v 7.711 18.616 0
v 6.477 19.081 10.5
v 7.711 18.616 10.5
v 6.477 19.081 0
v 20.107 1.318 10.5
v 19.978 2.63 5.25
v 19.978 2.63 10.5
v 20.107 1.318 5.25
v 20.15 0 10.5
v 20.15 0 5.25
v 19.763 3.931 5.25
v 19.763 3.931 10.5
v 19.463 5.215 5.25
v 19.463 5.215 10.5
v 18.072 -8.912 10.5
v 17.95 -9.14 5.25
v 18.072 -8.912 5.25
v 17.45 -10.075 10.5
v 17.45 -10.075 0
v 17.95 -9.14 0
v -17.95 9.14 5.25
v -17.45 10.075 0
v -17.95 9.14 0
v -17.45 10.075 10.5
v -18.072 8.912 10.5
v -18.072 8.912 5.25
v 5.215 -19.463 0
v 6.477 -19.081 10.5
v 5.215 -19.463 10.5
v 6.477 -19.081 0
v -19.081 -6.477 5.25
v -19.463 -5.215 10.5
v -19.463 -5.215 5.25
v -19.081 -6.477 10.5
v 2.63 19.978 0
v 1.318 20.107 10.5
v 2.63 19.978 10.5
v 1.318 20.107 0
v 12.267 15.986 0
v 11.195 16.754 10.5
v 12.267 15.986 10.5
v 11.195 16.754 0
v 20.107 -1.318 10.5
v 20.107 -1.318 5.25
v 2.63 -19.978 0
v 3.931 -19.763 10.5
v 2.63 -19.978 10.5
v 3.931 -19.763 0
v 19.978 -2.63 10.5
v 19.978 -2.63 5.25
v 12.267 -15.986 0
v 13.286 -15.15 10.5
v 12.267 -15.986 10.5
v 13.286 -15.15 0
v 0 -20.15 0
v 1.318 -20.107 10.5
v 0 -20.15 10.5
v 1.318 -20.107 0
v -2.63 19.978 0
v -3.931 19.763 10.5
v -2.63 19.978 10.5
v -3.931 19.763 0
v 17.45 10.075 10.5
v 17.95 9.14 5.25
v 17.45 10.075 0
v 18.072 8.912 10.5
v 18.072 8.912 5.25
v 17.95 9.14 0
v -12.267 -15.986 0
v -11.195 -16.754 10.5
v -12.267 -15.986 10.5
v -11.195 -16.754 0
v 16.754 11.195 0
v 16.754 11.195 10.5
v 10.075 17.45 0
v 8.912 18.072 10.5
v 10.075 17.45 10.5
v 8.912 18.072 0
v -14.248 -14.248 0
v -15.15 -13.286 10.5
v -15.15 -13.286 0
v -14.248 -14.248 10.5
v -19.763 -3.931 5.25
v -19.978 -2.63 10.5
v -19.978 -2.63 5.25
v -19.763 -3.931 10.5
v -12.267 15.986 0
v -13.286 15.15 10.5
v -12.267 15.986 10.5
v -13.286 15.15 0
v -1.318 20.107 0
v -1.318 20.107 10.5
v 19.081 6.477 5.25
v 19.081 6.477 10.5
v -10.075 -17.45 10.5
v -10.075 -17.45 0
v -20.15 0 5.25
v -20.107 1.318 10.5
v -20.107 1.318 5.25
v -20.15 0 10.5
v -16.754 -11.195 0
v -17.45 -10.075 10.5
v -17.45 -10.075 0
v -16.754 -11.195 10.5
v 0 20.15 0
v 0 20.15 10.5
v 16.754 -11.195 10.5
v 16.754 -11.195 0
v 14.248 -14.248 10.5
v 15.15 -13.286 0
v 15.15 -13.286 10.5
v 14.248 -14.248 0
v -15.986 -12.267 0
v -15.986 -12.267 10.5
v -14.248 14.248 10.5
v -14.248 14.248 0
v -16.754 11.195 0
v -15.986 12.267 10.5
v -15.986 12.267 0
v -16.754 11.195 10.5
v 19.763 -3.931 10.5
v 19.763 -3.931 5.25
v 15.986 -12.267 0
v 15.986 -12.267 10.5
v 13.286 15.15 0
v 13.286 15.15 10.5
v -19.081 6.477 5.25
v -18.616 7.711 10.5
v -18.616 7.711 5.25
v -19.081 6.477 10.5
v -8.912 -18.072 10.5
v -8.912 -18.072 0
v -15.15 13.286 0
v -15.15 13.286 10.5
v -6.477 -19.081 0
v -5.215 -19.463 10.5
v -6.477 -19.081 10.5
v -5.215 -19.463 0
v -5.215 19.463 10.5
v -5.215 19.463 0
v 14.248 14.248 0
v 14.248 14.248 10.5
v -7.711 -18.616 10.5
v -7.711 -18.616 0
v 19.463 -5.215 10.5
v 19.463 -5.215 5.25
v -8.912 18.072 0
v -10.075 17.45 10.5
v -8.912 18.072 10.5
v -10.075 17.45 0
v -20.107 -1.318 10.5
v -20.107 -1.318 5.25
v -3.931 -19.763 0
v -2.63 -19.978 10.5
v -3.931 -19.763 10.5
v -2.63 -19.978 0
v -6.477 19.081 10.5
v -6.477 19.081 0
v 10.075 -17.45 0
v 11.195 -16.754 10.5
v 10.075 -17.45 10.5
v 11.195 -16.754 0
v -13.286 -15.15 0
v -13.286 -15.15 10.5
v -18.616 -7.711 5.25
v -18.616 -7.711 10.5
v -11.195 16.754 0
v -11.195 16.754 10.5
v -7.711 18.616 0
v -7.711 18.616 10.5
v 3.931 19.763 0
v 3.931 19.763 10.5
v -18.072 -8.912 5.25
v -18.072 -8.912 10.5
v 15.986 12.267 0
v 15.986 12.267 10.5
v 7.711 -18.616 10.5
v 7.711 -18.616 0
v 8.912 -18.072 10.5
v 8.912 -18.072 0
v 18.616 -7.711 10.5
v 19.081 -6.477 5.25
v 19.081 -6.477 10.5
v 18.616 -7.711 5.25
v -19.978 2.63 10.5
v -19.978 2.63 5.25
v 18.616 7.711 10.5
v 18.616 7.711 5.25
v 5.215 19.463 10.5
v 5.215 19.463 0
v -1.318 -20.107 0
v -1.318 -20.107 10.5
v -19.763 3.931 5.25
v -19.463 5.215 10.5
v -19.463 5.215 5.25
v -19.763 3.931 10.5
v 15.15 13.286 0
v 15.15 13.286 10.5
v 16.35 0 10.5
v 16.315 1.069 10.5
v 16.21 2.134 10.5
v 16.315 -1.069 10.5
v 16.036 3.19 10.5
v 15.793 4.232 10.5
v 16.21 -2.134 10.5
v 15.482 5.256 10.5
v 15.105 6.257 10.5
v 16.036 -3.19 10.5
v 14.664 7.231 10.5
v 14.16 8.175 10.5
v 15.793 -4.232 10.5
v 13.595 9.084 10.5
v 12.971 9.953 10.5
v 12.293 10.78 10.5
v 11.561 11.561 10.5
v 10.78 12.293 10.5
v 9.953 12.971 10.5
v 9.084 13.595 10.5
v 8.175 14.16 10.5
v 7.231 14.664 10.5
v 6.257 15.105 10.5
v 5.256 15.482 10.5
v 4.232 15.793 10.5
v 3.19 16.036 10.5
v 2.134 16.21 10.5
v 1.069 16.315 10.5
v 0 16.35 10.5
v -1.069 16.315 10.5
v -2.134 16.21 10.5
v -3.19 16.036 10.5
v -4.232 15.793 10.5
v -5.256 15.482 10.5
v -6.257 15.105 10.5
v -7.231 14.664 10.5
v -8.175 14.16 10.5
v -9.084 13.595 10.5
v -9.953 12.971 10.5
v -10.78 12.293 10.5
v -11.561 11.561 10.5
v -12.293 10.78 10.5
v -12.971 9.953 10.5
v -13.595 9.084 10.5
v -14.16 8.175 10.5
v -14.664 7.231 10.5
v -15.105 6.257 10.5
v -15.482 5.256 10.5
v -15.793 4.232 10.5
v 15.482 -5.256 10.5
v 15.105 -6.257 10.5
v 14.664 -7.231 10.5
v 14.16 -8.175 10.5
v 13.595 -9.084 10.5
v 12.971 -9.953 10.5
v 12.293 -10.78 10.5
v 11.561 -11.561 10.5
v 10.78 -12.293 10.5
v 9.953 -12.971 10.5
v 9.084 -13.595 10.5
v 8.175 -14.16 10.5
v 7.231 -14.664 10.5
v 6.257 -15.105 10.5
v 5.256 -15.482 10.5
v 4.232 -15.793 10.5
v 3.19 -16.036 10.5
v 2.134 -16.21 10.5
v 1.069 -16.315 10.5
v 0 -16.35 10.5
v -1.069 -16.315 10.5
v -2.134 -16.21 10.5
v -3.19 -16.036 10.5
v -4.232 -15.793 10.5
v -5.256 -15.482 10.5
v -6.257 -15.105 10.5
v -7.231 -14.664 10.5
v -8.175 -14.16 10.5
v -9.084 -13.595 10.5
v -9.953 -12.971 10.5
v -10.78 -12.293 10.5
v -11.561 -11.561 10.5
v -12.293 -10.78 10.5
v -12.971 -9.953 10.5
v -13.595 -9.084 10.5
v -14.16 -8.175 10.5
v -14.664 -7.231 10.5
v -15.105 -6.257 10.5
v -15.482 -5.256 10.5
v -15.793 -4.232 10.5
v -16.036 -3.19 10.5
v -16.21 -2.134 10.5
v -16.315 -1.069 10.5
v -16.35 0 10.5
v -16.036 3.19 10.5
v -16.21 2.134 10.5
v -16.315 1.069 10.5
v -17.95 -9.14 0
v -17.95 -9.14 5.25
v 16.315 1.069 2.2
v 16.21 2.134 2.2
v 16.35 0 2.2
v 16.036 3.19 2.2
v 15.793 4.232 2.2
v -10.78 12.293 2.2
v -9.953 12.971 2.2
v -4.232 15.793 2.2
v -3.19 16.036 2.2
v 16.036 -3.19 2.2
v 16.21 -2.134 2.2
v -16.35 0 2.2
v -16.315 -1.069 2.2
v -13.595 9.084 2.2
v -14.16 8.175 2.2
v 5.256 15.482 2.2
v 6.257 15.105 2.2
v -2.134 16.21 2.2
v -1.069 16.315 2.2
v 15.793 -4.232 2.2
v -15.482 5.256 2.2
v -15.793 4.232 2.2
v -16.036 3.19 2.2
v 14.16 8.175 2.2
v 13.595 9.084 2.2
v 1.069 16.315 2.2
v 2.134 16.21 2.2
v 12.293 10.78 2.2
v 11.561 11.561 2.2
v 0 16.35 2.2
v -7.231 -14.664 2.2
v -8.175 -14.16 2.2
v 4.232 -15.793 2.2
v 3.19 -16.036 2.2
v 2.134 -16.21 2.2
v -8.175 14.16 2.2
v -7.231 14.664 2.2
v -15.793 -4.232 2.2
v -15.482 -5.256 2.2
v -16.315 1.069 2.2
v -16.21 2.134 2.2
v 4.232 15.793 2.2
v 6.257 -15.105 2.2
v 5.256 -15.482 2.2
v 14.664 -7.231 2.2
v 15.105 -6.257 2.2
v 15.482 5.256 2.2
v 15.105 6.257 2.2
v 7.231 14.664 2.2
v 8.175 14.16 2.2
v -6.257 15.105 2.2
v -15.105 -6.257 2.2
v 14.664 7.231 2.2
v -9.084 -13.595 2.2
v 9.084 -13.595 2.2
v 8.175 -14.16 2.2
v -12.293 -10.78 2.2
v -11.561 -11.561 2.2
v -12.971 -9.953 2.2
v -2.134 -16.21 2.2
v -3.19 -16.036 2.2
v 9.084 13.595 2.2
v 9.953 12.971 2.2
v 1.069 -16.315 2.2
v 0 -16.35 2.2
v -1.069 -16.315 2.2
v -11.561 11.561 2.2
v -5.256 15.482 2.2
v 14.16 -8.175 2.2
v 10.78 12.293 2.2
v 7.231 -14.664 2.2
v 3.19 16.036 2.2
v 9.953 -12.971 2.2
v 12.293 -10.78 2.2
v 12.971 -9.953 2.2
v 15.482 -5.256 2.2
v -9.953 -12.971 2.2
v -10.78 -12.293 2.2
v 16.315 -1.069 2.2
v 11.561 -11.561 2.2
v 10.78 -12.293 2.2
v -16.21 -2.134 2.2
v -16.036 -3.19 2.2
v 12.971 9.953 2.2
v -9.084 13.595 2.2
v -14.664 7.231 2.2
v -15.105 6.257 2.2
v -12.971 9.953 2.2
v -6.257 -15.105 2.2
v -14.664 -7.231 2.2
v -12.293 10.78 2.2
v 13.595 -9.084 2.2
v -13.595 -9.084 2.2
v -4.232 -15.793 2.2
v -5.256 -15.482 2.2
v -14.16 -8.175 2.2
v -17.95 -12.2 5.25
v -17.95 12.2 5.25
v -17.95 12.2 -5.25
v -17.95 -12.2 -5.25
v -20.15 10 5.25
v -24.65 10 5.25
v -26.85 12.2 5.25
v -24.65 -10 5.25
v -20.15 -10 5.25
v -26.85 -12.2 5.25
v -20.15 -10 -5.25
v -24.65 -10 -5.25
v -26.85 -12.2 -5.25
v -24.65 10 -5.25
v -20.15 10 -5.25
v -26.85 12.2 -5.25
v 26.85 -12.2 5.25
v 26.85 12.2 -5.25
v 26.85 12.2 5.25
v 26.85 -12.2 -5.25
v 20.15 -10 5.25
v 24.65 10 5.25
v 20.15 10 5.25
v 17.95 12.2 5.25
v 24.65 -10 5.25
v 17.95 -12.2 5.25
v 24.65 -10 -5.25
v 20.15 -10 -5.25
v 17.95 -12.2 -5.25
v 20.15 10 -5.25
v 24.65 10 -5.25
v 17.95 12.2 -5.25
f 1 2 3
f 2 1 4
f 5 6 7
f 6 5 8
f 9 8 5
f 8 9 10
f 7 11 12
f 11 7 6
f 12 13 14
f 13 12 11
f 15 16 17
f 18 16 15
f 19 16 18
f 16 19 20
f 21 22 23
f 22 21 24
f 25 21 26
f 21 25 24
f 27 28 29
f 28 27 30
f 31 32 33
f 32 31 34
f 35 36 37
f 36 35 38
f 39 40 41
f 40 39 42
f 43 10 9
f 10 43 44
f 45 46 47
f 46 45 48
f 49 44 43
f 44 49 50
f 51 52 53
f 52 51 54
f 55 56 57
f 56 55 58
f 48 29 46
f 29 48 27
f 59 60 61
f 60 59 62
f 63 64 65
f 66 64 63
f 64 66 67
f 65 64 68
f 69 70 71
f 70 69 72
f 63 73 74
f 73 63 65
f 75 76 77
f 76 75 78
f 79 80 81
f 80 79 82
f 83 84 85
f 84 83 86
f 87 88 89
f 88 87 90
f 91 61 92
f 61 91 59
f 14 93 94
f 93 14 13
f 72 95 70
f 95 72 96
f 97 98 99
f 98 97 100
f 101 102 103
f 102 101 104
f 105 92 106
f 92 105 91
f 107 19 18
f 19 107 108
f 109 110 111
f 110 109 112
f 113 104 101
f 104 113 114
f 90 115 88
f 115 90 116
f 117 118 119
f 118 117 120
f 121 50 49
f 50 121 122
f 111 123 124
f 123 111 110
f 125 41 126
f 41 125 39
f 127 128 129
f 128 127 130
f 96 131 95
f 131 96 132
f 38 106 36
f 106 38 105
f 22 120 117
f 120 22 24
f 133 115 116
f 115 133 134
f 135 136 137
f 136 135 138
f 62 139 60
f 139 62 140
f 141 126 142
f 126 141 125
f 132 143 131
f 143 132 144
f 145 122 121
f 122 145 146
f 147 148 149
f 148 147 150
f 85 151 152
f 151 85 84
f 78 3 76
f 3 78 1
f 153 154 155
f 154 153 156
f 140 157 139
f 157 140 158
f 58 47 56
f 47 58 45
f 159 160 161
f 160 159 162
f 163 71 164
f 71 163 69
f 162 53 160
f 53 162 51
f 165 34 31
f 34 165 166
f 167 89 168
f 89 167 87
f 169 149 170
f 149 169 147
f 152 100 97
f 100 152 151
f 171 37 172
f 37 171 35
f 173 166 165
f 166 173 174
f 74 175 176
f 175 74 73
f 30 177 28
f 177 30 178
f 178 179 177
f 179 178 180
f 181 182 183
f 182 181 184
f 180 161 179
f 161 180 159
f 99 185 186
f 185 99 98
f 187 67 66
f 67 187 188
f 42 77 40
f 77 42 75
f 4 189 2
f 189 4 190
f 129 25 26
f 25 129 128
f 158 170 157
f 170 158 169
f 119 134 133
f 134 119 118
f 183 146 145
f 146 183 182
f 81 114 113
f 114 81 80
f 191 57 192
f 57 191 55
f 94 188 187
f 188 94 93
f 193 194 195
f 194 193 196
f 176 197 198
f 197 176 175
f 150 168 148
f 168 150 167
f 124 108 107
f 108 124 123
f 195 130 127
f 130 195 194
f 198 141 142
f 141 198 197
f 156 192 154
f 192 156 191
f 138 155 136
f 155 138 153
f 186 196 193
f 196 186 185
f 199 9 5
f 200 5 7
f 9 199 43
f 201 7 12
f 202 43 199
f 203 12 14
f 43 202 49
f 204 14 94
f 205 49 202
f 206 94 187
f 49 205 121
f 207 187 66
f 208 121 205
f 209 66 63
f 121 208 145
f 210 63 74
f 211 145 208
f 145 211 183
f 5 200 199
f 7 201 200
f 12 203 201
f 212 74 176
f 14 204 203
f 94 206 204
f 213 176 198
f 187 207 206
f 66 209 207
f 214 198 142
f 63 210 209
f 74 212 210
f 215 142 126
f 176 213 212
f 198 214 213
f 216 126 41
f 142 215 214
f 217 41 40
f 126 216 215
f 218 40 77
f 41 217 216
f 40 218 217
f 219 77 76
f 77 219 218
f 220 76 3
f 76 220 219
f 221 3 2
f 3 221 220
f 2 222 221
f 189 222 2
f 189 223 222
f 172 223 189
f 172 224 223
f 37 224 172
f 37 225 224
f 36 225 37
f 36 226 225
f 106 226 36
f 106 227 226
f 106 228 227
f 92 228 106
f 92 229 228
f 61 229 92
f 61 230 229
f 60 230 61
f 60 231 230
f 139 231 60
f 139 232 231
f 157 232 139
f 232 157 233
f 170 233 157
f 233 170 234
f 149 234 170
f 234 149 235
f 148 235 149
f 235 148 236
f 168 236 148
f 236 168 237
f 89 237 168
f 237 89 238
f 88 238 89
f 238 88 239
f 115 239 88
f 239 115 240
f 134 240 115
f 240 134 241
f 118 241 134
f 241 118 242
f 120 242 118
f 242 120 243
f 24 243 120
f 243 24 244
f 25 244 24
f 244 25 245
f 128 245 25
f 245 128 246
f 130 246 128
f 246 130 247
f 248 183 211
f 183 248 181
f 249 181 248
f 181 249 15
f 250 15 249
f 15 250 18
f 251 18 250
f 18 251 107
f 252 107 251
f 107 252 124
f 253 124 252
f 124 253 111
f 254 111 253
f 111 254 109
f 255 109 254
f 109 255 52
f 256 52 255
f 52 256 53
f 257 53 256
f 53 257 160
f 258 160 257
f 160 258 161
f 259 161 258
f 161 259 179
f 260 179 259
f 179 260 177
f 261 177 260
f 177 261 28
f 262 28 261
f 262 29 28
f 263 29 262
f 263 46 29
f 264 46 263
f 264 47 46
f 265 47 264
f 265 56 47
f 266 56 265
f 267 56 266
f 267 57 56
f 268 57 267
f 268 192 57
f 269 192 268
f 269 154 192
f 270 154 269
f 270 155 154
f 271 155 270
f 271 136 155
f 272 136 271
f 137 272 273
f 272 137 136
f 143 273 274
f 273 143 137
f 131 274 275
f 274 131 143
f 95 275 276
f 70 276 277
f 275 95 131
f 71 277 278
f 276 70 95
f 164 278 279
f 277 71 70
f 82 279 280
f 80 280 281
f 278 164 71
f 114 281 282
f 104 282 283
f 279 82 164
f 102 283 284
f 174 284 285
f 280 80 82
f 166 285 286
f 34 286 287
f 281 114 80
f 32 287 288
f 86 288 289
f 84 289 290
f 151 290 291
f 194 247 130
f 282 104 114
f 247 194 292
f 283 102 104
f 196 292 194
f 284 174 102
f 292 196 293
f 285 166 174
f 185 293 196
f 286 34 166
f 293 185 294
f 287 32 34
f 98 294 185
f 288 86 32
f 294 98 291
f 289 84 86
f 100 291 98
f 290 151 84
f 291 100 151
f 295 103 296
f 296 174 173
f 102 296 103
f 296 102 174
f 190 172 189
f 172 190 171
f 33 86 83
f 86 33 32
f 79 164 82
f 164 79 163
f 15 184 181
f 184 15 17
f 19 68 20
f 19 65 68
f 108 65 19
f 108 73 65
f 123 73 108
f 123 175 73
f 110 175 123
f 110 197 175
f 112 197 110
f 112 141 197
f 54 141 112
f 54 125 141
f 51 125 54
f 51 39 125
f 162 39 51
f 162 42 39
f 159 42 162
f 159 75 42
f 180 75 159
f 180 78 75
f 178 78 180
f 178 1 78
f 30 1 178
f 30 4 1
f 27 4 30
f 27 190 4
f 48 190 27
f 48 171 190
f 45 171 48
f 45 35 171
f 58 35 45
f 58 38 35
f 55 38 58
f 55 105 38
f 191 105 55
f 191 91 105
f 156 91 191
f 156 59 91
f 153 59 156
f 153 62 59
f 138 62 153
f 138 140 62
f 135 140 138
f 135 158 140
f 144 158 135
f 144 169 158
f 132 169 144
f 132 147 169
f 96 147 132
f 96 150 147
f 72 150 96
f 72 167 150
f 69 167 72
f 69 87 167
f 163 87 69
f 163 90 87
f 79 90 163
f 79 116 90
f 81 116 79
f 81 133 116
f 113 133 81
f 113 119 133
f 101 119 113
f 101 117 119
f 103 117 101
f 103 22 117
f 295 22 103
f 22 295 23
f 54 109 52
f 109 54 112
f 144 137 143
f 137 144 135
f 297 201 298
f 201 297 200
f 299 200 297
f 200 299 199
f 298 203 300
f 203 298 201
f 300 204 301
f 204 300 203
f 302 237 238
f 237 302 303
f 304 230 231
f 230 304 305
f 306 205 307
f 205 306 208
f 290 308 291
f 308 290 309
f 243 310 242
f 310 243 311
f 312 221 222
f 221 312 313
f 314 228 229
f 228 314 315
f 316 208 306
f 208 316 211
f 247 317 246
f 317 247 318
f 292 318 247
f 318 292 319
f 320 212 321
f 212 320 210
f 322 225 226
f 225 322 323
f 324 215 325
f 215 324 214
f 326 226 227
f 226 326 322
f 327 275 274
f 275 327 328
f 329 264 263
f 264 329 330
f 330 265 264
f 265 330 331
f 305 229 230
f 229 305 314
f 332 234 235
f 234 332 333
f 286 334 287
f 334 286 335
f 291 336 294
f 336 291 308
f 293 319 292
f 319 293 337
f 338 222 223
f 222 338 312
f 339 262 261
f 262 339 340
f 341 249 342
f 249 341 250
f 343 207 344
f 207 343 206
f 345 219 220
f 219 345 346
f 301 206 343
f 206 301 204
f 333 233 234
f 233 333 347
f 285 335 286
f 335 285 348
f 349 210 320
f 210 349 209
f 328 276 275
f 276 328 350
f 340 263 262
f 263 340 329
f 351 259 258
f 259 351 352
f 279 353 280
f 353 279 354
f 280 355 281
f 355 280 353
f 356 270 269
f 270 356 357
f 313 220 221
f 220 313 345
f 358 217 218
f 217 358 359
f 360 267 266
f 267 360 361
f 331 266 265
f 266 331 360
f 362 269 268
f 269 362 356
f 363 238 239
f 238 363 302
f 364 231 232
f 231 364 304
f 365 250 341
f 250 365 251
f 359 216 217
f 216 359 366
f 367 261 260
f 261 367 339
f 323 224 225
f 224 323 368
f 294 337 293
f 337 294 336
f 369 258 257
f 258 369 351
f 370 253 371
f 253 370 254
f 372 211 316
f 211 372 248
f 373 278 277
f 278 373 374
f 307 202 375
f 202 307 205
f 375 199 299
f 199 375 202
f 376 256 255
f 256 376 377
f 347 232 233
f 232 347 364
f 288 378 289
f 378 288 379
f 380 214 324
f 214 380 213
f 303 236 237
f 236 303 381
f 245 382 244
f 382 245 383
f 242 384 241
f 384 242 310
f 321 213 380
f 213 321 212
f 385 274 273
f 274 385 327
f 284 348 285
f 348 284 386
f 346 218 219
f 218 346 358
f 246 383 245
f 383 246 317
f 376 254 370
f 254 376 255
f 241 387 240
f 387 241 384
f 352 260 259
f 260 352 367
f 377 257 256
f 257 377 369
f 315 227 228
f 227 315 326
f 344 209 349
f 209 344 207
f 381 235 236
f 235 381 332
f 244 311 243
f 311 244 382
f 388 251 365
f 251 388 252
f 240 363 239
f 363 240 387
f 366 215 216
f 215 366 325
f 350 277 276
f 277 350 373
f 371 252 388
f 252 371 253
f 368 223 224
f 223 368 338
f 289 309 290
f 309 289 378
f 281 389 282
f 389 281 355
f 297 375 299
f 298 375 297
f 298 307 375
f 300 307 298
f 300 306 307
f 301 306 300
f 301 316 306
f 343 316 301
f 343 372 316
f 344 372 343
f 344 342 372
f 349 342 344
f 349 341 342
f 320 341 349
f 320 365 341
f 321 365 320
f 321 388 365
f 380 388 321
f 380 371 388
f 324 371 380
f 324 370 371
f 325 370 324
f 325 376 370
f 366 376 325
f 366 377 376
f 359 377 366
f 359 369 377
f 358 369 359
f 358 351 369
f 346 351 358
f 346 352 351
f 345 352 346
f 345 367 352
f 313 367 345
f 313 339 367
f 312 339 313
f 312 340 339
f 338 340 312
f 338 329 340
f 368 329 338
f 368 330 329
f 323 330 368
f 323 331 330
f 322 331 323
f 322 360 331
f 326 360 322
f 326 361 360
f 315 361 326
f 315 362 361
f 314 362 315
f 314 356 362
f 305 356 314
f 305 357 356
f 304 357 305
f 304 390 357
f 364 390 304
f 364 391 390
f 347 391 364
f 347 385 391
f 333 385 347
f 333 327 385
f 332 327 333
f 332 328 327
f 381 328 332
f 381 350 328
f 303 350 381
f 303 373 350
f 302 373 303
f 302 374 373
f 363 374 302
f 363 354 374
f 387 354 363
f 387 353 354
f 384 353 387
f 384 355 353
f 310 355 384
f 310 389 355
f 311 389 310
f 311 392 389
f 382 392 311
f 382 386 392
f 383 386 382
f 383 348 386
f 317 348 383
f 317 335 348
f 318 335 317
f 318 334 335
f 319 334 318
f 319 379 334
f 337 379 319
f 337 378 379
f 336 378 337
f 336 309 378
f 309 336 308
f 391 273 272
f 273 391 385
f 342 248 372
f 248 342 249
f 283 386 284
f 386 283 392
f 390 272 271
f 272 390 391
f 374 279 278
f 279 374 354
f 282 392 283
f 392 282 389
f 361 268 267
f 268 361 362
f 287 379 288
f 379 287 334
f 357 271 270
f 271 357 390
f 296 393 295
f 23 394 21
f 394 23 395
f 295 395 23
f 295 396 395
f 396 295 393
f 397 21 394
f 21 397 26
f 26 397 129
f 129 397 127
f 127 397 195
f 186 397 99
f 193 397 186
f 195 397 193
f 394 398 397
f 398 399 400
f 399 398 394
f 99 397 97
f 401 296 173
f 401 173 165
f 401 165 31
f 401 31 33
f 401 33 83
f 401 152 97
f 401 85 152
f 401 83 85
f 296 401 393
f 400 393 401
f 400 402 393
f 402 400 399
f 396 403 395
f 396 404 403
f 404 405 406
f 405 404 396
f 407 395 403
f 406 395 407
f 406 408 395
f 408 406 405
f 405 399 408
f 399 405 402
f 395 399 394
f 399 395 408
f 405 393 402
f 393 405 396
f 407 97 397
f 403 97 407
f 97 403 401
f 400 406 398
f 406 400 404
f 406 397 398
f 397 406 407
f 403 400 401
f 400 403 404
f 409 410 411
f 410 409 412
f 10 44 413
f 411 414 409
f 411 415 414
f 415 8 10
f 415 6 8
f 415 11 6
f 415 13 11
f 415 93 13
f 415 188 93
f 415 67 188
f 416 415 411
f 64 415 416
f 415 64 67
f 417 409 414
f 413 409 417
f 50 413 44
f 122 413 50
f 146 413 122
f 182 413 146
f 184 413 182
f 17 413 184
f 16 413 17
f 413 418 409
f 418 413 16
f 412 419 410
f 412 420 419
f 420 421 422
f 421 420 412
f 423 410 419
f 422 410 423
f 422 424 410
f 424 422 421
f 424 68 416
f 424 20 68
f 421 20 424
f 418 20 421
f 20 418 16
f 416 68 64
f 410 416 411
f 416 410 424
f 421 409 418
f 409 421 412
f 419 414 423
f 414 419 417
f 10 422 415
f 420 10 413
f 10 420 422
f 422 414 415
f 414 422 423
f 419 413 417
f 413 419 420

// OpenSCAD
// TS-PET-B01 - AirTag Collar Holder
$fn = 96; airtag_d = 31.9; wall = 2.2; overall_t = 10.5; strap_w = 20; loop_wall = 2.2; loop_gap = 4.5;
module ring_shell() { difference() { cylinder(h = overall_t, d = airtag_d + 2*wall + 4); translate([0,0,wall]) cylinder(h = overall_t, d = airtag_d + 0.8); } }
module strap_loop(xoff) { difference() { translate([xoff,0,0]) cube([loop_wall*2 + loop_gap, strap_w + 2*loop_wall, overall_t], center = true); translate([xoff,0,-1]) cube([loop_gap, strap_w, overall_t + 2], center = true); } }
union() { ring_shell(); strap_loop(-(airtag_d/2 + wall + loop_gap/2 + 2)); strap_loop( (airtag_d/2 + wall + loop_gap/2 + 2)); }
